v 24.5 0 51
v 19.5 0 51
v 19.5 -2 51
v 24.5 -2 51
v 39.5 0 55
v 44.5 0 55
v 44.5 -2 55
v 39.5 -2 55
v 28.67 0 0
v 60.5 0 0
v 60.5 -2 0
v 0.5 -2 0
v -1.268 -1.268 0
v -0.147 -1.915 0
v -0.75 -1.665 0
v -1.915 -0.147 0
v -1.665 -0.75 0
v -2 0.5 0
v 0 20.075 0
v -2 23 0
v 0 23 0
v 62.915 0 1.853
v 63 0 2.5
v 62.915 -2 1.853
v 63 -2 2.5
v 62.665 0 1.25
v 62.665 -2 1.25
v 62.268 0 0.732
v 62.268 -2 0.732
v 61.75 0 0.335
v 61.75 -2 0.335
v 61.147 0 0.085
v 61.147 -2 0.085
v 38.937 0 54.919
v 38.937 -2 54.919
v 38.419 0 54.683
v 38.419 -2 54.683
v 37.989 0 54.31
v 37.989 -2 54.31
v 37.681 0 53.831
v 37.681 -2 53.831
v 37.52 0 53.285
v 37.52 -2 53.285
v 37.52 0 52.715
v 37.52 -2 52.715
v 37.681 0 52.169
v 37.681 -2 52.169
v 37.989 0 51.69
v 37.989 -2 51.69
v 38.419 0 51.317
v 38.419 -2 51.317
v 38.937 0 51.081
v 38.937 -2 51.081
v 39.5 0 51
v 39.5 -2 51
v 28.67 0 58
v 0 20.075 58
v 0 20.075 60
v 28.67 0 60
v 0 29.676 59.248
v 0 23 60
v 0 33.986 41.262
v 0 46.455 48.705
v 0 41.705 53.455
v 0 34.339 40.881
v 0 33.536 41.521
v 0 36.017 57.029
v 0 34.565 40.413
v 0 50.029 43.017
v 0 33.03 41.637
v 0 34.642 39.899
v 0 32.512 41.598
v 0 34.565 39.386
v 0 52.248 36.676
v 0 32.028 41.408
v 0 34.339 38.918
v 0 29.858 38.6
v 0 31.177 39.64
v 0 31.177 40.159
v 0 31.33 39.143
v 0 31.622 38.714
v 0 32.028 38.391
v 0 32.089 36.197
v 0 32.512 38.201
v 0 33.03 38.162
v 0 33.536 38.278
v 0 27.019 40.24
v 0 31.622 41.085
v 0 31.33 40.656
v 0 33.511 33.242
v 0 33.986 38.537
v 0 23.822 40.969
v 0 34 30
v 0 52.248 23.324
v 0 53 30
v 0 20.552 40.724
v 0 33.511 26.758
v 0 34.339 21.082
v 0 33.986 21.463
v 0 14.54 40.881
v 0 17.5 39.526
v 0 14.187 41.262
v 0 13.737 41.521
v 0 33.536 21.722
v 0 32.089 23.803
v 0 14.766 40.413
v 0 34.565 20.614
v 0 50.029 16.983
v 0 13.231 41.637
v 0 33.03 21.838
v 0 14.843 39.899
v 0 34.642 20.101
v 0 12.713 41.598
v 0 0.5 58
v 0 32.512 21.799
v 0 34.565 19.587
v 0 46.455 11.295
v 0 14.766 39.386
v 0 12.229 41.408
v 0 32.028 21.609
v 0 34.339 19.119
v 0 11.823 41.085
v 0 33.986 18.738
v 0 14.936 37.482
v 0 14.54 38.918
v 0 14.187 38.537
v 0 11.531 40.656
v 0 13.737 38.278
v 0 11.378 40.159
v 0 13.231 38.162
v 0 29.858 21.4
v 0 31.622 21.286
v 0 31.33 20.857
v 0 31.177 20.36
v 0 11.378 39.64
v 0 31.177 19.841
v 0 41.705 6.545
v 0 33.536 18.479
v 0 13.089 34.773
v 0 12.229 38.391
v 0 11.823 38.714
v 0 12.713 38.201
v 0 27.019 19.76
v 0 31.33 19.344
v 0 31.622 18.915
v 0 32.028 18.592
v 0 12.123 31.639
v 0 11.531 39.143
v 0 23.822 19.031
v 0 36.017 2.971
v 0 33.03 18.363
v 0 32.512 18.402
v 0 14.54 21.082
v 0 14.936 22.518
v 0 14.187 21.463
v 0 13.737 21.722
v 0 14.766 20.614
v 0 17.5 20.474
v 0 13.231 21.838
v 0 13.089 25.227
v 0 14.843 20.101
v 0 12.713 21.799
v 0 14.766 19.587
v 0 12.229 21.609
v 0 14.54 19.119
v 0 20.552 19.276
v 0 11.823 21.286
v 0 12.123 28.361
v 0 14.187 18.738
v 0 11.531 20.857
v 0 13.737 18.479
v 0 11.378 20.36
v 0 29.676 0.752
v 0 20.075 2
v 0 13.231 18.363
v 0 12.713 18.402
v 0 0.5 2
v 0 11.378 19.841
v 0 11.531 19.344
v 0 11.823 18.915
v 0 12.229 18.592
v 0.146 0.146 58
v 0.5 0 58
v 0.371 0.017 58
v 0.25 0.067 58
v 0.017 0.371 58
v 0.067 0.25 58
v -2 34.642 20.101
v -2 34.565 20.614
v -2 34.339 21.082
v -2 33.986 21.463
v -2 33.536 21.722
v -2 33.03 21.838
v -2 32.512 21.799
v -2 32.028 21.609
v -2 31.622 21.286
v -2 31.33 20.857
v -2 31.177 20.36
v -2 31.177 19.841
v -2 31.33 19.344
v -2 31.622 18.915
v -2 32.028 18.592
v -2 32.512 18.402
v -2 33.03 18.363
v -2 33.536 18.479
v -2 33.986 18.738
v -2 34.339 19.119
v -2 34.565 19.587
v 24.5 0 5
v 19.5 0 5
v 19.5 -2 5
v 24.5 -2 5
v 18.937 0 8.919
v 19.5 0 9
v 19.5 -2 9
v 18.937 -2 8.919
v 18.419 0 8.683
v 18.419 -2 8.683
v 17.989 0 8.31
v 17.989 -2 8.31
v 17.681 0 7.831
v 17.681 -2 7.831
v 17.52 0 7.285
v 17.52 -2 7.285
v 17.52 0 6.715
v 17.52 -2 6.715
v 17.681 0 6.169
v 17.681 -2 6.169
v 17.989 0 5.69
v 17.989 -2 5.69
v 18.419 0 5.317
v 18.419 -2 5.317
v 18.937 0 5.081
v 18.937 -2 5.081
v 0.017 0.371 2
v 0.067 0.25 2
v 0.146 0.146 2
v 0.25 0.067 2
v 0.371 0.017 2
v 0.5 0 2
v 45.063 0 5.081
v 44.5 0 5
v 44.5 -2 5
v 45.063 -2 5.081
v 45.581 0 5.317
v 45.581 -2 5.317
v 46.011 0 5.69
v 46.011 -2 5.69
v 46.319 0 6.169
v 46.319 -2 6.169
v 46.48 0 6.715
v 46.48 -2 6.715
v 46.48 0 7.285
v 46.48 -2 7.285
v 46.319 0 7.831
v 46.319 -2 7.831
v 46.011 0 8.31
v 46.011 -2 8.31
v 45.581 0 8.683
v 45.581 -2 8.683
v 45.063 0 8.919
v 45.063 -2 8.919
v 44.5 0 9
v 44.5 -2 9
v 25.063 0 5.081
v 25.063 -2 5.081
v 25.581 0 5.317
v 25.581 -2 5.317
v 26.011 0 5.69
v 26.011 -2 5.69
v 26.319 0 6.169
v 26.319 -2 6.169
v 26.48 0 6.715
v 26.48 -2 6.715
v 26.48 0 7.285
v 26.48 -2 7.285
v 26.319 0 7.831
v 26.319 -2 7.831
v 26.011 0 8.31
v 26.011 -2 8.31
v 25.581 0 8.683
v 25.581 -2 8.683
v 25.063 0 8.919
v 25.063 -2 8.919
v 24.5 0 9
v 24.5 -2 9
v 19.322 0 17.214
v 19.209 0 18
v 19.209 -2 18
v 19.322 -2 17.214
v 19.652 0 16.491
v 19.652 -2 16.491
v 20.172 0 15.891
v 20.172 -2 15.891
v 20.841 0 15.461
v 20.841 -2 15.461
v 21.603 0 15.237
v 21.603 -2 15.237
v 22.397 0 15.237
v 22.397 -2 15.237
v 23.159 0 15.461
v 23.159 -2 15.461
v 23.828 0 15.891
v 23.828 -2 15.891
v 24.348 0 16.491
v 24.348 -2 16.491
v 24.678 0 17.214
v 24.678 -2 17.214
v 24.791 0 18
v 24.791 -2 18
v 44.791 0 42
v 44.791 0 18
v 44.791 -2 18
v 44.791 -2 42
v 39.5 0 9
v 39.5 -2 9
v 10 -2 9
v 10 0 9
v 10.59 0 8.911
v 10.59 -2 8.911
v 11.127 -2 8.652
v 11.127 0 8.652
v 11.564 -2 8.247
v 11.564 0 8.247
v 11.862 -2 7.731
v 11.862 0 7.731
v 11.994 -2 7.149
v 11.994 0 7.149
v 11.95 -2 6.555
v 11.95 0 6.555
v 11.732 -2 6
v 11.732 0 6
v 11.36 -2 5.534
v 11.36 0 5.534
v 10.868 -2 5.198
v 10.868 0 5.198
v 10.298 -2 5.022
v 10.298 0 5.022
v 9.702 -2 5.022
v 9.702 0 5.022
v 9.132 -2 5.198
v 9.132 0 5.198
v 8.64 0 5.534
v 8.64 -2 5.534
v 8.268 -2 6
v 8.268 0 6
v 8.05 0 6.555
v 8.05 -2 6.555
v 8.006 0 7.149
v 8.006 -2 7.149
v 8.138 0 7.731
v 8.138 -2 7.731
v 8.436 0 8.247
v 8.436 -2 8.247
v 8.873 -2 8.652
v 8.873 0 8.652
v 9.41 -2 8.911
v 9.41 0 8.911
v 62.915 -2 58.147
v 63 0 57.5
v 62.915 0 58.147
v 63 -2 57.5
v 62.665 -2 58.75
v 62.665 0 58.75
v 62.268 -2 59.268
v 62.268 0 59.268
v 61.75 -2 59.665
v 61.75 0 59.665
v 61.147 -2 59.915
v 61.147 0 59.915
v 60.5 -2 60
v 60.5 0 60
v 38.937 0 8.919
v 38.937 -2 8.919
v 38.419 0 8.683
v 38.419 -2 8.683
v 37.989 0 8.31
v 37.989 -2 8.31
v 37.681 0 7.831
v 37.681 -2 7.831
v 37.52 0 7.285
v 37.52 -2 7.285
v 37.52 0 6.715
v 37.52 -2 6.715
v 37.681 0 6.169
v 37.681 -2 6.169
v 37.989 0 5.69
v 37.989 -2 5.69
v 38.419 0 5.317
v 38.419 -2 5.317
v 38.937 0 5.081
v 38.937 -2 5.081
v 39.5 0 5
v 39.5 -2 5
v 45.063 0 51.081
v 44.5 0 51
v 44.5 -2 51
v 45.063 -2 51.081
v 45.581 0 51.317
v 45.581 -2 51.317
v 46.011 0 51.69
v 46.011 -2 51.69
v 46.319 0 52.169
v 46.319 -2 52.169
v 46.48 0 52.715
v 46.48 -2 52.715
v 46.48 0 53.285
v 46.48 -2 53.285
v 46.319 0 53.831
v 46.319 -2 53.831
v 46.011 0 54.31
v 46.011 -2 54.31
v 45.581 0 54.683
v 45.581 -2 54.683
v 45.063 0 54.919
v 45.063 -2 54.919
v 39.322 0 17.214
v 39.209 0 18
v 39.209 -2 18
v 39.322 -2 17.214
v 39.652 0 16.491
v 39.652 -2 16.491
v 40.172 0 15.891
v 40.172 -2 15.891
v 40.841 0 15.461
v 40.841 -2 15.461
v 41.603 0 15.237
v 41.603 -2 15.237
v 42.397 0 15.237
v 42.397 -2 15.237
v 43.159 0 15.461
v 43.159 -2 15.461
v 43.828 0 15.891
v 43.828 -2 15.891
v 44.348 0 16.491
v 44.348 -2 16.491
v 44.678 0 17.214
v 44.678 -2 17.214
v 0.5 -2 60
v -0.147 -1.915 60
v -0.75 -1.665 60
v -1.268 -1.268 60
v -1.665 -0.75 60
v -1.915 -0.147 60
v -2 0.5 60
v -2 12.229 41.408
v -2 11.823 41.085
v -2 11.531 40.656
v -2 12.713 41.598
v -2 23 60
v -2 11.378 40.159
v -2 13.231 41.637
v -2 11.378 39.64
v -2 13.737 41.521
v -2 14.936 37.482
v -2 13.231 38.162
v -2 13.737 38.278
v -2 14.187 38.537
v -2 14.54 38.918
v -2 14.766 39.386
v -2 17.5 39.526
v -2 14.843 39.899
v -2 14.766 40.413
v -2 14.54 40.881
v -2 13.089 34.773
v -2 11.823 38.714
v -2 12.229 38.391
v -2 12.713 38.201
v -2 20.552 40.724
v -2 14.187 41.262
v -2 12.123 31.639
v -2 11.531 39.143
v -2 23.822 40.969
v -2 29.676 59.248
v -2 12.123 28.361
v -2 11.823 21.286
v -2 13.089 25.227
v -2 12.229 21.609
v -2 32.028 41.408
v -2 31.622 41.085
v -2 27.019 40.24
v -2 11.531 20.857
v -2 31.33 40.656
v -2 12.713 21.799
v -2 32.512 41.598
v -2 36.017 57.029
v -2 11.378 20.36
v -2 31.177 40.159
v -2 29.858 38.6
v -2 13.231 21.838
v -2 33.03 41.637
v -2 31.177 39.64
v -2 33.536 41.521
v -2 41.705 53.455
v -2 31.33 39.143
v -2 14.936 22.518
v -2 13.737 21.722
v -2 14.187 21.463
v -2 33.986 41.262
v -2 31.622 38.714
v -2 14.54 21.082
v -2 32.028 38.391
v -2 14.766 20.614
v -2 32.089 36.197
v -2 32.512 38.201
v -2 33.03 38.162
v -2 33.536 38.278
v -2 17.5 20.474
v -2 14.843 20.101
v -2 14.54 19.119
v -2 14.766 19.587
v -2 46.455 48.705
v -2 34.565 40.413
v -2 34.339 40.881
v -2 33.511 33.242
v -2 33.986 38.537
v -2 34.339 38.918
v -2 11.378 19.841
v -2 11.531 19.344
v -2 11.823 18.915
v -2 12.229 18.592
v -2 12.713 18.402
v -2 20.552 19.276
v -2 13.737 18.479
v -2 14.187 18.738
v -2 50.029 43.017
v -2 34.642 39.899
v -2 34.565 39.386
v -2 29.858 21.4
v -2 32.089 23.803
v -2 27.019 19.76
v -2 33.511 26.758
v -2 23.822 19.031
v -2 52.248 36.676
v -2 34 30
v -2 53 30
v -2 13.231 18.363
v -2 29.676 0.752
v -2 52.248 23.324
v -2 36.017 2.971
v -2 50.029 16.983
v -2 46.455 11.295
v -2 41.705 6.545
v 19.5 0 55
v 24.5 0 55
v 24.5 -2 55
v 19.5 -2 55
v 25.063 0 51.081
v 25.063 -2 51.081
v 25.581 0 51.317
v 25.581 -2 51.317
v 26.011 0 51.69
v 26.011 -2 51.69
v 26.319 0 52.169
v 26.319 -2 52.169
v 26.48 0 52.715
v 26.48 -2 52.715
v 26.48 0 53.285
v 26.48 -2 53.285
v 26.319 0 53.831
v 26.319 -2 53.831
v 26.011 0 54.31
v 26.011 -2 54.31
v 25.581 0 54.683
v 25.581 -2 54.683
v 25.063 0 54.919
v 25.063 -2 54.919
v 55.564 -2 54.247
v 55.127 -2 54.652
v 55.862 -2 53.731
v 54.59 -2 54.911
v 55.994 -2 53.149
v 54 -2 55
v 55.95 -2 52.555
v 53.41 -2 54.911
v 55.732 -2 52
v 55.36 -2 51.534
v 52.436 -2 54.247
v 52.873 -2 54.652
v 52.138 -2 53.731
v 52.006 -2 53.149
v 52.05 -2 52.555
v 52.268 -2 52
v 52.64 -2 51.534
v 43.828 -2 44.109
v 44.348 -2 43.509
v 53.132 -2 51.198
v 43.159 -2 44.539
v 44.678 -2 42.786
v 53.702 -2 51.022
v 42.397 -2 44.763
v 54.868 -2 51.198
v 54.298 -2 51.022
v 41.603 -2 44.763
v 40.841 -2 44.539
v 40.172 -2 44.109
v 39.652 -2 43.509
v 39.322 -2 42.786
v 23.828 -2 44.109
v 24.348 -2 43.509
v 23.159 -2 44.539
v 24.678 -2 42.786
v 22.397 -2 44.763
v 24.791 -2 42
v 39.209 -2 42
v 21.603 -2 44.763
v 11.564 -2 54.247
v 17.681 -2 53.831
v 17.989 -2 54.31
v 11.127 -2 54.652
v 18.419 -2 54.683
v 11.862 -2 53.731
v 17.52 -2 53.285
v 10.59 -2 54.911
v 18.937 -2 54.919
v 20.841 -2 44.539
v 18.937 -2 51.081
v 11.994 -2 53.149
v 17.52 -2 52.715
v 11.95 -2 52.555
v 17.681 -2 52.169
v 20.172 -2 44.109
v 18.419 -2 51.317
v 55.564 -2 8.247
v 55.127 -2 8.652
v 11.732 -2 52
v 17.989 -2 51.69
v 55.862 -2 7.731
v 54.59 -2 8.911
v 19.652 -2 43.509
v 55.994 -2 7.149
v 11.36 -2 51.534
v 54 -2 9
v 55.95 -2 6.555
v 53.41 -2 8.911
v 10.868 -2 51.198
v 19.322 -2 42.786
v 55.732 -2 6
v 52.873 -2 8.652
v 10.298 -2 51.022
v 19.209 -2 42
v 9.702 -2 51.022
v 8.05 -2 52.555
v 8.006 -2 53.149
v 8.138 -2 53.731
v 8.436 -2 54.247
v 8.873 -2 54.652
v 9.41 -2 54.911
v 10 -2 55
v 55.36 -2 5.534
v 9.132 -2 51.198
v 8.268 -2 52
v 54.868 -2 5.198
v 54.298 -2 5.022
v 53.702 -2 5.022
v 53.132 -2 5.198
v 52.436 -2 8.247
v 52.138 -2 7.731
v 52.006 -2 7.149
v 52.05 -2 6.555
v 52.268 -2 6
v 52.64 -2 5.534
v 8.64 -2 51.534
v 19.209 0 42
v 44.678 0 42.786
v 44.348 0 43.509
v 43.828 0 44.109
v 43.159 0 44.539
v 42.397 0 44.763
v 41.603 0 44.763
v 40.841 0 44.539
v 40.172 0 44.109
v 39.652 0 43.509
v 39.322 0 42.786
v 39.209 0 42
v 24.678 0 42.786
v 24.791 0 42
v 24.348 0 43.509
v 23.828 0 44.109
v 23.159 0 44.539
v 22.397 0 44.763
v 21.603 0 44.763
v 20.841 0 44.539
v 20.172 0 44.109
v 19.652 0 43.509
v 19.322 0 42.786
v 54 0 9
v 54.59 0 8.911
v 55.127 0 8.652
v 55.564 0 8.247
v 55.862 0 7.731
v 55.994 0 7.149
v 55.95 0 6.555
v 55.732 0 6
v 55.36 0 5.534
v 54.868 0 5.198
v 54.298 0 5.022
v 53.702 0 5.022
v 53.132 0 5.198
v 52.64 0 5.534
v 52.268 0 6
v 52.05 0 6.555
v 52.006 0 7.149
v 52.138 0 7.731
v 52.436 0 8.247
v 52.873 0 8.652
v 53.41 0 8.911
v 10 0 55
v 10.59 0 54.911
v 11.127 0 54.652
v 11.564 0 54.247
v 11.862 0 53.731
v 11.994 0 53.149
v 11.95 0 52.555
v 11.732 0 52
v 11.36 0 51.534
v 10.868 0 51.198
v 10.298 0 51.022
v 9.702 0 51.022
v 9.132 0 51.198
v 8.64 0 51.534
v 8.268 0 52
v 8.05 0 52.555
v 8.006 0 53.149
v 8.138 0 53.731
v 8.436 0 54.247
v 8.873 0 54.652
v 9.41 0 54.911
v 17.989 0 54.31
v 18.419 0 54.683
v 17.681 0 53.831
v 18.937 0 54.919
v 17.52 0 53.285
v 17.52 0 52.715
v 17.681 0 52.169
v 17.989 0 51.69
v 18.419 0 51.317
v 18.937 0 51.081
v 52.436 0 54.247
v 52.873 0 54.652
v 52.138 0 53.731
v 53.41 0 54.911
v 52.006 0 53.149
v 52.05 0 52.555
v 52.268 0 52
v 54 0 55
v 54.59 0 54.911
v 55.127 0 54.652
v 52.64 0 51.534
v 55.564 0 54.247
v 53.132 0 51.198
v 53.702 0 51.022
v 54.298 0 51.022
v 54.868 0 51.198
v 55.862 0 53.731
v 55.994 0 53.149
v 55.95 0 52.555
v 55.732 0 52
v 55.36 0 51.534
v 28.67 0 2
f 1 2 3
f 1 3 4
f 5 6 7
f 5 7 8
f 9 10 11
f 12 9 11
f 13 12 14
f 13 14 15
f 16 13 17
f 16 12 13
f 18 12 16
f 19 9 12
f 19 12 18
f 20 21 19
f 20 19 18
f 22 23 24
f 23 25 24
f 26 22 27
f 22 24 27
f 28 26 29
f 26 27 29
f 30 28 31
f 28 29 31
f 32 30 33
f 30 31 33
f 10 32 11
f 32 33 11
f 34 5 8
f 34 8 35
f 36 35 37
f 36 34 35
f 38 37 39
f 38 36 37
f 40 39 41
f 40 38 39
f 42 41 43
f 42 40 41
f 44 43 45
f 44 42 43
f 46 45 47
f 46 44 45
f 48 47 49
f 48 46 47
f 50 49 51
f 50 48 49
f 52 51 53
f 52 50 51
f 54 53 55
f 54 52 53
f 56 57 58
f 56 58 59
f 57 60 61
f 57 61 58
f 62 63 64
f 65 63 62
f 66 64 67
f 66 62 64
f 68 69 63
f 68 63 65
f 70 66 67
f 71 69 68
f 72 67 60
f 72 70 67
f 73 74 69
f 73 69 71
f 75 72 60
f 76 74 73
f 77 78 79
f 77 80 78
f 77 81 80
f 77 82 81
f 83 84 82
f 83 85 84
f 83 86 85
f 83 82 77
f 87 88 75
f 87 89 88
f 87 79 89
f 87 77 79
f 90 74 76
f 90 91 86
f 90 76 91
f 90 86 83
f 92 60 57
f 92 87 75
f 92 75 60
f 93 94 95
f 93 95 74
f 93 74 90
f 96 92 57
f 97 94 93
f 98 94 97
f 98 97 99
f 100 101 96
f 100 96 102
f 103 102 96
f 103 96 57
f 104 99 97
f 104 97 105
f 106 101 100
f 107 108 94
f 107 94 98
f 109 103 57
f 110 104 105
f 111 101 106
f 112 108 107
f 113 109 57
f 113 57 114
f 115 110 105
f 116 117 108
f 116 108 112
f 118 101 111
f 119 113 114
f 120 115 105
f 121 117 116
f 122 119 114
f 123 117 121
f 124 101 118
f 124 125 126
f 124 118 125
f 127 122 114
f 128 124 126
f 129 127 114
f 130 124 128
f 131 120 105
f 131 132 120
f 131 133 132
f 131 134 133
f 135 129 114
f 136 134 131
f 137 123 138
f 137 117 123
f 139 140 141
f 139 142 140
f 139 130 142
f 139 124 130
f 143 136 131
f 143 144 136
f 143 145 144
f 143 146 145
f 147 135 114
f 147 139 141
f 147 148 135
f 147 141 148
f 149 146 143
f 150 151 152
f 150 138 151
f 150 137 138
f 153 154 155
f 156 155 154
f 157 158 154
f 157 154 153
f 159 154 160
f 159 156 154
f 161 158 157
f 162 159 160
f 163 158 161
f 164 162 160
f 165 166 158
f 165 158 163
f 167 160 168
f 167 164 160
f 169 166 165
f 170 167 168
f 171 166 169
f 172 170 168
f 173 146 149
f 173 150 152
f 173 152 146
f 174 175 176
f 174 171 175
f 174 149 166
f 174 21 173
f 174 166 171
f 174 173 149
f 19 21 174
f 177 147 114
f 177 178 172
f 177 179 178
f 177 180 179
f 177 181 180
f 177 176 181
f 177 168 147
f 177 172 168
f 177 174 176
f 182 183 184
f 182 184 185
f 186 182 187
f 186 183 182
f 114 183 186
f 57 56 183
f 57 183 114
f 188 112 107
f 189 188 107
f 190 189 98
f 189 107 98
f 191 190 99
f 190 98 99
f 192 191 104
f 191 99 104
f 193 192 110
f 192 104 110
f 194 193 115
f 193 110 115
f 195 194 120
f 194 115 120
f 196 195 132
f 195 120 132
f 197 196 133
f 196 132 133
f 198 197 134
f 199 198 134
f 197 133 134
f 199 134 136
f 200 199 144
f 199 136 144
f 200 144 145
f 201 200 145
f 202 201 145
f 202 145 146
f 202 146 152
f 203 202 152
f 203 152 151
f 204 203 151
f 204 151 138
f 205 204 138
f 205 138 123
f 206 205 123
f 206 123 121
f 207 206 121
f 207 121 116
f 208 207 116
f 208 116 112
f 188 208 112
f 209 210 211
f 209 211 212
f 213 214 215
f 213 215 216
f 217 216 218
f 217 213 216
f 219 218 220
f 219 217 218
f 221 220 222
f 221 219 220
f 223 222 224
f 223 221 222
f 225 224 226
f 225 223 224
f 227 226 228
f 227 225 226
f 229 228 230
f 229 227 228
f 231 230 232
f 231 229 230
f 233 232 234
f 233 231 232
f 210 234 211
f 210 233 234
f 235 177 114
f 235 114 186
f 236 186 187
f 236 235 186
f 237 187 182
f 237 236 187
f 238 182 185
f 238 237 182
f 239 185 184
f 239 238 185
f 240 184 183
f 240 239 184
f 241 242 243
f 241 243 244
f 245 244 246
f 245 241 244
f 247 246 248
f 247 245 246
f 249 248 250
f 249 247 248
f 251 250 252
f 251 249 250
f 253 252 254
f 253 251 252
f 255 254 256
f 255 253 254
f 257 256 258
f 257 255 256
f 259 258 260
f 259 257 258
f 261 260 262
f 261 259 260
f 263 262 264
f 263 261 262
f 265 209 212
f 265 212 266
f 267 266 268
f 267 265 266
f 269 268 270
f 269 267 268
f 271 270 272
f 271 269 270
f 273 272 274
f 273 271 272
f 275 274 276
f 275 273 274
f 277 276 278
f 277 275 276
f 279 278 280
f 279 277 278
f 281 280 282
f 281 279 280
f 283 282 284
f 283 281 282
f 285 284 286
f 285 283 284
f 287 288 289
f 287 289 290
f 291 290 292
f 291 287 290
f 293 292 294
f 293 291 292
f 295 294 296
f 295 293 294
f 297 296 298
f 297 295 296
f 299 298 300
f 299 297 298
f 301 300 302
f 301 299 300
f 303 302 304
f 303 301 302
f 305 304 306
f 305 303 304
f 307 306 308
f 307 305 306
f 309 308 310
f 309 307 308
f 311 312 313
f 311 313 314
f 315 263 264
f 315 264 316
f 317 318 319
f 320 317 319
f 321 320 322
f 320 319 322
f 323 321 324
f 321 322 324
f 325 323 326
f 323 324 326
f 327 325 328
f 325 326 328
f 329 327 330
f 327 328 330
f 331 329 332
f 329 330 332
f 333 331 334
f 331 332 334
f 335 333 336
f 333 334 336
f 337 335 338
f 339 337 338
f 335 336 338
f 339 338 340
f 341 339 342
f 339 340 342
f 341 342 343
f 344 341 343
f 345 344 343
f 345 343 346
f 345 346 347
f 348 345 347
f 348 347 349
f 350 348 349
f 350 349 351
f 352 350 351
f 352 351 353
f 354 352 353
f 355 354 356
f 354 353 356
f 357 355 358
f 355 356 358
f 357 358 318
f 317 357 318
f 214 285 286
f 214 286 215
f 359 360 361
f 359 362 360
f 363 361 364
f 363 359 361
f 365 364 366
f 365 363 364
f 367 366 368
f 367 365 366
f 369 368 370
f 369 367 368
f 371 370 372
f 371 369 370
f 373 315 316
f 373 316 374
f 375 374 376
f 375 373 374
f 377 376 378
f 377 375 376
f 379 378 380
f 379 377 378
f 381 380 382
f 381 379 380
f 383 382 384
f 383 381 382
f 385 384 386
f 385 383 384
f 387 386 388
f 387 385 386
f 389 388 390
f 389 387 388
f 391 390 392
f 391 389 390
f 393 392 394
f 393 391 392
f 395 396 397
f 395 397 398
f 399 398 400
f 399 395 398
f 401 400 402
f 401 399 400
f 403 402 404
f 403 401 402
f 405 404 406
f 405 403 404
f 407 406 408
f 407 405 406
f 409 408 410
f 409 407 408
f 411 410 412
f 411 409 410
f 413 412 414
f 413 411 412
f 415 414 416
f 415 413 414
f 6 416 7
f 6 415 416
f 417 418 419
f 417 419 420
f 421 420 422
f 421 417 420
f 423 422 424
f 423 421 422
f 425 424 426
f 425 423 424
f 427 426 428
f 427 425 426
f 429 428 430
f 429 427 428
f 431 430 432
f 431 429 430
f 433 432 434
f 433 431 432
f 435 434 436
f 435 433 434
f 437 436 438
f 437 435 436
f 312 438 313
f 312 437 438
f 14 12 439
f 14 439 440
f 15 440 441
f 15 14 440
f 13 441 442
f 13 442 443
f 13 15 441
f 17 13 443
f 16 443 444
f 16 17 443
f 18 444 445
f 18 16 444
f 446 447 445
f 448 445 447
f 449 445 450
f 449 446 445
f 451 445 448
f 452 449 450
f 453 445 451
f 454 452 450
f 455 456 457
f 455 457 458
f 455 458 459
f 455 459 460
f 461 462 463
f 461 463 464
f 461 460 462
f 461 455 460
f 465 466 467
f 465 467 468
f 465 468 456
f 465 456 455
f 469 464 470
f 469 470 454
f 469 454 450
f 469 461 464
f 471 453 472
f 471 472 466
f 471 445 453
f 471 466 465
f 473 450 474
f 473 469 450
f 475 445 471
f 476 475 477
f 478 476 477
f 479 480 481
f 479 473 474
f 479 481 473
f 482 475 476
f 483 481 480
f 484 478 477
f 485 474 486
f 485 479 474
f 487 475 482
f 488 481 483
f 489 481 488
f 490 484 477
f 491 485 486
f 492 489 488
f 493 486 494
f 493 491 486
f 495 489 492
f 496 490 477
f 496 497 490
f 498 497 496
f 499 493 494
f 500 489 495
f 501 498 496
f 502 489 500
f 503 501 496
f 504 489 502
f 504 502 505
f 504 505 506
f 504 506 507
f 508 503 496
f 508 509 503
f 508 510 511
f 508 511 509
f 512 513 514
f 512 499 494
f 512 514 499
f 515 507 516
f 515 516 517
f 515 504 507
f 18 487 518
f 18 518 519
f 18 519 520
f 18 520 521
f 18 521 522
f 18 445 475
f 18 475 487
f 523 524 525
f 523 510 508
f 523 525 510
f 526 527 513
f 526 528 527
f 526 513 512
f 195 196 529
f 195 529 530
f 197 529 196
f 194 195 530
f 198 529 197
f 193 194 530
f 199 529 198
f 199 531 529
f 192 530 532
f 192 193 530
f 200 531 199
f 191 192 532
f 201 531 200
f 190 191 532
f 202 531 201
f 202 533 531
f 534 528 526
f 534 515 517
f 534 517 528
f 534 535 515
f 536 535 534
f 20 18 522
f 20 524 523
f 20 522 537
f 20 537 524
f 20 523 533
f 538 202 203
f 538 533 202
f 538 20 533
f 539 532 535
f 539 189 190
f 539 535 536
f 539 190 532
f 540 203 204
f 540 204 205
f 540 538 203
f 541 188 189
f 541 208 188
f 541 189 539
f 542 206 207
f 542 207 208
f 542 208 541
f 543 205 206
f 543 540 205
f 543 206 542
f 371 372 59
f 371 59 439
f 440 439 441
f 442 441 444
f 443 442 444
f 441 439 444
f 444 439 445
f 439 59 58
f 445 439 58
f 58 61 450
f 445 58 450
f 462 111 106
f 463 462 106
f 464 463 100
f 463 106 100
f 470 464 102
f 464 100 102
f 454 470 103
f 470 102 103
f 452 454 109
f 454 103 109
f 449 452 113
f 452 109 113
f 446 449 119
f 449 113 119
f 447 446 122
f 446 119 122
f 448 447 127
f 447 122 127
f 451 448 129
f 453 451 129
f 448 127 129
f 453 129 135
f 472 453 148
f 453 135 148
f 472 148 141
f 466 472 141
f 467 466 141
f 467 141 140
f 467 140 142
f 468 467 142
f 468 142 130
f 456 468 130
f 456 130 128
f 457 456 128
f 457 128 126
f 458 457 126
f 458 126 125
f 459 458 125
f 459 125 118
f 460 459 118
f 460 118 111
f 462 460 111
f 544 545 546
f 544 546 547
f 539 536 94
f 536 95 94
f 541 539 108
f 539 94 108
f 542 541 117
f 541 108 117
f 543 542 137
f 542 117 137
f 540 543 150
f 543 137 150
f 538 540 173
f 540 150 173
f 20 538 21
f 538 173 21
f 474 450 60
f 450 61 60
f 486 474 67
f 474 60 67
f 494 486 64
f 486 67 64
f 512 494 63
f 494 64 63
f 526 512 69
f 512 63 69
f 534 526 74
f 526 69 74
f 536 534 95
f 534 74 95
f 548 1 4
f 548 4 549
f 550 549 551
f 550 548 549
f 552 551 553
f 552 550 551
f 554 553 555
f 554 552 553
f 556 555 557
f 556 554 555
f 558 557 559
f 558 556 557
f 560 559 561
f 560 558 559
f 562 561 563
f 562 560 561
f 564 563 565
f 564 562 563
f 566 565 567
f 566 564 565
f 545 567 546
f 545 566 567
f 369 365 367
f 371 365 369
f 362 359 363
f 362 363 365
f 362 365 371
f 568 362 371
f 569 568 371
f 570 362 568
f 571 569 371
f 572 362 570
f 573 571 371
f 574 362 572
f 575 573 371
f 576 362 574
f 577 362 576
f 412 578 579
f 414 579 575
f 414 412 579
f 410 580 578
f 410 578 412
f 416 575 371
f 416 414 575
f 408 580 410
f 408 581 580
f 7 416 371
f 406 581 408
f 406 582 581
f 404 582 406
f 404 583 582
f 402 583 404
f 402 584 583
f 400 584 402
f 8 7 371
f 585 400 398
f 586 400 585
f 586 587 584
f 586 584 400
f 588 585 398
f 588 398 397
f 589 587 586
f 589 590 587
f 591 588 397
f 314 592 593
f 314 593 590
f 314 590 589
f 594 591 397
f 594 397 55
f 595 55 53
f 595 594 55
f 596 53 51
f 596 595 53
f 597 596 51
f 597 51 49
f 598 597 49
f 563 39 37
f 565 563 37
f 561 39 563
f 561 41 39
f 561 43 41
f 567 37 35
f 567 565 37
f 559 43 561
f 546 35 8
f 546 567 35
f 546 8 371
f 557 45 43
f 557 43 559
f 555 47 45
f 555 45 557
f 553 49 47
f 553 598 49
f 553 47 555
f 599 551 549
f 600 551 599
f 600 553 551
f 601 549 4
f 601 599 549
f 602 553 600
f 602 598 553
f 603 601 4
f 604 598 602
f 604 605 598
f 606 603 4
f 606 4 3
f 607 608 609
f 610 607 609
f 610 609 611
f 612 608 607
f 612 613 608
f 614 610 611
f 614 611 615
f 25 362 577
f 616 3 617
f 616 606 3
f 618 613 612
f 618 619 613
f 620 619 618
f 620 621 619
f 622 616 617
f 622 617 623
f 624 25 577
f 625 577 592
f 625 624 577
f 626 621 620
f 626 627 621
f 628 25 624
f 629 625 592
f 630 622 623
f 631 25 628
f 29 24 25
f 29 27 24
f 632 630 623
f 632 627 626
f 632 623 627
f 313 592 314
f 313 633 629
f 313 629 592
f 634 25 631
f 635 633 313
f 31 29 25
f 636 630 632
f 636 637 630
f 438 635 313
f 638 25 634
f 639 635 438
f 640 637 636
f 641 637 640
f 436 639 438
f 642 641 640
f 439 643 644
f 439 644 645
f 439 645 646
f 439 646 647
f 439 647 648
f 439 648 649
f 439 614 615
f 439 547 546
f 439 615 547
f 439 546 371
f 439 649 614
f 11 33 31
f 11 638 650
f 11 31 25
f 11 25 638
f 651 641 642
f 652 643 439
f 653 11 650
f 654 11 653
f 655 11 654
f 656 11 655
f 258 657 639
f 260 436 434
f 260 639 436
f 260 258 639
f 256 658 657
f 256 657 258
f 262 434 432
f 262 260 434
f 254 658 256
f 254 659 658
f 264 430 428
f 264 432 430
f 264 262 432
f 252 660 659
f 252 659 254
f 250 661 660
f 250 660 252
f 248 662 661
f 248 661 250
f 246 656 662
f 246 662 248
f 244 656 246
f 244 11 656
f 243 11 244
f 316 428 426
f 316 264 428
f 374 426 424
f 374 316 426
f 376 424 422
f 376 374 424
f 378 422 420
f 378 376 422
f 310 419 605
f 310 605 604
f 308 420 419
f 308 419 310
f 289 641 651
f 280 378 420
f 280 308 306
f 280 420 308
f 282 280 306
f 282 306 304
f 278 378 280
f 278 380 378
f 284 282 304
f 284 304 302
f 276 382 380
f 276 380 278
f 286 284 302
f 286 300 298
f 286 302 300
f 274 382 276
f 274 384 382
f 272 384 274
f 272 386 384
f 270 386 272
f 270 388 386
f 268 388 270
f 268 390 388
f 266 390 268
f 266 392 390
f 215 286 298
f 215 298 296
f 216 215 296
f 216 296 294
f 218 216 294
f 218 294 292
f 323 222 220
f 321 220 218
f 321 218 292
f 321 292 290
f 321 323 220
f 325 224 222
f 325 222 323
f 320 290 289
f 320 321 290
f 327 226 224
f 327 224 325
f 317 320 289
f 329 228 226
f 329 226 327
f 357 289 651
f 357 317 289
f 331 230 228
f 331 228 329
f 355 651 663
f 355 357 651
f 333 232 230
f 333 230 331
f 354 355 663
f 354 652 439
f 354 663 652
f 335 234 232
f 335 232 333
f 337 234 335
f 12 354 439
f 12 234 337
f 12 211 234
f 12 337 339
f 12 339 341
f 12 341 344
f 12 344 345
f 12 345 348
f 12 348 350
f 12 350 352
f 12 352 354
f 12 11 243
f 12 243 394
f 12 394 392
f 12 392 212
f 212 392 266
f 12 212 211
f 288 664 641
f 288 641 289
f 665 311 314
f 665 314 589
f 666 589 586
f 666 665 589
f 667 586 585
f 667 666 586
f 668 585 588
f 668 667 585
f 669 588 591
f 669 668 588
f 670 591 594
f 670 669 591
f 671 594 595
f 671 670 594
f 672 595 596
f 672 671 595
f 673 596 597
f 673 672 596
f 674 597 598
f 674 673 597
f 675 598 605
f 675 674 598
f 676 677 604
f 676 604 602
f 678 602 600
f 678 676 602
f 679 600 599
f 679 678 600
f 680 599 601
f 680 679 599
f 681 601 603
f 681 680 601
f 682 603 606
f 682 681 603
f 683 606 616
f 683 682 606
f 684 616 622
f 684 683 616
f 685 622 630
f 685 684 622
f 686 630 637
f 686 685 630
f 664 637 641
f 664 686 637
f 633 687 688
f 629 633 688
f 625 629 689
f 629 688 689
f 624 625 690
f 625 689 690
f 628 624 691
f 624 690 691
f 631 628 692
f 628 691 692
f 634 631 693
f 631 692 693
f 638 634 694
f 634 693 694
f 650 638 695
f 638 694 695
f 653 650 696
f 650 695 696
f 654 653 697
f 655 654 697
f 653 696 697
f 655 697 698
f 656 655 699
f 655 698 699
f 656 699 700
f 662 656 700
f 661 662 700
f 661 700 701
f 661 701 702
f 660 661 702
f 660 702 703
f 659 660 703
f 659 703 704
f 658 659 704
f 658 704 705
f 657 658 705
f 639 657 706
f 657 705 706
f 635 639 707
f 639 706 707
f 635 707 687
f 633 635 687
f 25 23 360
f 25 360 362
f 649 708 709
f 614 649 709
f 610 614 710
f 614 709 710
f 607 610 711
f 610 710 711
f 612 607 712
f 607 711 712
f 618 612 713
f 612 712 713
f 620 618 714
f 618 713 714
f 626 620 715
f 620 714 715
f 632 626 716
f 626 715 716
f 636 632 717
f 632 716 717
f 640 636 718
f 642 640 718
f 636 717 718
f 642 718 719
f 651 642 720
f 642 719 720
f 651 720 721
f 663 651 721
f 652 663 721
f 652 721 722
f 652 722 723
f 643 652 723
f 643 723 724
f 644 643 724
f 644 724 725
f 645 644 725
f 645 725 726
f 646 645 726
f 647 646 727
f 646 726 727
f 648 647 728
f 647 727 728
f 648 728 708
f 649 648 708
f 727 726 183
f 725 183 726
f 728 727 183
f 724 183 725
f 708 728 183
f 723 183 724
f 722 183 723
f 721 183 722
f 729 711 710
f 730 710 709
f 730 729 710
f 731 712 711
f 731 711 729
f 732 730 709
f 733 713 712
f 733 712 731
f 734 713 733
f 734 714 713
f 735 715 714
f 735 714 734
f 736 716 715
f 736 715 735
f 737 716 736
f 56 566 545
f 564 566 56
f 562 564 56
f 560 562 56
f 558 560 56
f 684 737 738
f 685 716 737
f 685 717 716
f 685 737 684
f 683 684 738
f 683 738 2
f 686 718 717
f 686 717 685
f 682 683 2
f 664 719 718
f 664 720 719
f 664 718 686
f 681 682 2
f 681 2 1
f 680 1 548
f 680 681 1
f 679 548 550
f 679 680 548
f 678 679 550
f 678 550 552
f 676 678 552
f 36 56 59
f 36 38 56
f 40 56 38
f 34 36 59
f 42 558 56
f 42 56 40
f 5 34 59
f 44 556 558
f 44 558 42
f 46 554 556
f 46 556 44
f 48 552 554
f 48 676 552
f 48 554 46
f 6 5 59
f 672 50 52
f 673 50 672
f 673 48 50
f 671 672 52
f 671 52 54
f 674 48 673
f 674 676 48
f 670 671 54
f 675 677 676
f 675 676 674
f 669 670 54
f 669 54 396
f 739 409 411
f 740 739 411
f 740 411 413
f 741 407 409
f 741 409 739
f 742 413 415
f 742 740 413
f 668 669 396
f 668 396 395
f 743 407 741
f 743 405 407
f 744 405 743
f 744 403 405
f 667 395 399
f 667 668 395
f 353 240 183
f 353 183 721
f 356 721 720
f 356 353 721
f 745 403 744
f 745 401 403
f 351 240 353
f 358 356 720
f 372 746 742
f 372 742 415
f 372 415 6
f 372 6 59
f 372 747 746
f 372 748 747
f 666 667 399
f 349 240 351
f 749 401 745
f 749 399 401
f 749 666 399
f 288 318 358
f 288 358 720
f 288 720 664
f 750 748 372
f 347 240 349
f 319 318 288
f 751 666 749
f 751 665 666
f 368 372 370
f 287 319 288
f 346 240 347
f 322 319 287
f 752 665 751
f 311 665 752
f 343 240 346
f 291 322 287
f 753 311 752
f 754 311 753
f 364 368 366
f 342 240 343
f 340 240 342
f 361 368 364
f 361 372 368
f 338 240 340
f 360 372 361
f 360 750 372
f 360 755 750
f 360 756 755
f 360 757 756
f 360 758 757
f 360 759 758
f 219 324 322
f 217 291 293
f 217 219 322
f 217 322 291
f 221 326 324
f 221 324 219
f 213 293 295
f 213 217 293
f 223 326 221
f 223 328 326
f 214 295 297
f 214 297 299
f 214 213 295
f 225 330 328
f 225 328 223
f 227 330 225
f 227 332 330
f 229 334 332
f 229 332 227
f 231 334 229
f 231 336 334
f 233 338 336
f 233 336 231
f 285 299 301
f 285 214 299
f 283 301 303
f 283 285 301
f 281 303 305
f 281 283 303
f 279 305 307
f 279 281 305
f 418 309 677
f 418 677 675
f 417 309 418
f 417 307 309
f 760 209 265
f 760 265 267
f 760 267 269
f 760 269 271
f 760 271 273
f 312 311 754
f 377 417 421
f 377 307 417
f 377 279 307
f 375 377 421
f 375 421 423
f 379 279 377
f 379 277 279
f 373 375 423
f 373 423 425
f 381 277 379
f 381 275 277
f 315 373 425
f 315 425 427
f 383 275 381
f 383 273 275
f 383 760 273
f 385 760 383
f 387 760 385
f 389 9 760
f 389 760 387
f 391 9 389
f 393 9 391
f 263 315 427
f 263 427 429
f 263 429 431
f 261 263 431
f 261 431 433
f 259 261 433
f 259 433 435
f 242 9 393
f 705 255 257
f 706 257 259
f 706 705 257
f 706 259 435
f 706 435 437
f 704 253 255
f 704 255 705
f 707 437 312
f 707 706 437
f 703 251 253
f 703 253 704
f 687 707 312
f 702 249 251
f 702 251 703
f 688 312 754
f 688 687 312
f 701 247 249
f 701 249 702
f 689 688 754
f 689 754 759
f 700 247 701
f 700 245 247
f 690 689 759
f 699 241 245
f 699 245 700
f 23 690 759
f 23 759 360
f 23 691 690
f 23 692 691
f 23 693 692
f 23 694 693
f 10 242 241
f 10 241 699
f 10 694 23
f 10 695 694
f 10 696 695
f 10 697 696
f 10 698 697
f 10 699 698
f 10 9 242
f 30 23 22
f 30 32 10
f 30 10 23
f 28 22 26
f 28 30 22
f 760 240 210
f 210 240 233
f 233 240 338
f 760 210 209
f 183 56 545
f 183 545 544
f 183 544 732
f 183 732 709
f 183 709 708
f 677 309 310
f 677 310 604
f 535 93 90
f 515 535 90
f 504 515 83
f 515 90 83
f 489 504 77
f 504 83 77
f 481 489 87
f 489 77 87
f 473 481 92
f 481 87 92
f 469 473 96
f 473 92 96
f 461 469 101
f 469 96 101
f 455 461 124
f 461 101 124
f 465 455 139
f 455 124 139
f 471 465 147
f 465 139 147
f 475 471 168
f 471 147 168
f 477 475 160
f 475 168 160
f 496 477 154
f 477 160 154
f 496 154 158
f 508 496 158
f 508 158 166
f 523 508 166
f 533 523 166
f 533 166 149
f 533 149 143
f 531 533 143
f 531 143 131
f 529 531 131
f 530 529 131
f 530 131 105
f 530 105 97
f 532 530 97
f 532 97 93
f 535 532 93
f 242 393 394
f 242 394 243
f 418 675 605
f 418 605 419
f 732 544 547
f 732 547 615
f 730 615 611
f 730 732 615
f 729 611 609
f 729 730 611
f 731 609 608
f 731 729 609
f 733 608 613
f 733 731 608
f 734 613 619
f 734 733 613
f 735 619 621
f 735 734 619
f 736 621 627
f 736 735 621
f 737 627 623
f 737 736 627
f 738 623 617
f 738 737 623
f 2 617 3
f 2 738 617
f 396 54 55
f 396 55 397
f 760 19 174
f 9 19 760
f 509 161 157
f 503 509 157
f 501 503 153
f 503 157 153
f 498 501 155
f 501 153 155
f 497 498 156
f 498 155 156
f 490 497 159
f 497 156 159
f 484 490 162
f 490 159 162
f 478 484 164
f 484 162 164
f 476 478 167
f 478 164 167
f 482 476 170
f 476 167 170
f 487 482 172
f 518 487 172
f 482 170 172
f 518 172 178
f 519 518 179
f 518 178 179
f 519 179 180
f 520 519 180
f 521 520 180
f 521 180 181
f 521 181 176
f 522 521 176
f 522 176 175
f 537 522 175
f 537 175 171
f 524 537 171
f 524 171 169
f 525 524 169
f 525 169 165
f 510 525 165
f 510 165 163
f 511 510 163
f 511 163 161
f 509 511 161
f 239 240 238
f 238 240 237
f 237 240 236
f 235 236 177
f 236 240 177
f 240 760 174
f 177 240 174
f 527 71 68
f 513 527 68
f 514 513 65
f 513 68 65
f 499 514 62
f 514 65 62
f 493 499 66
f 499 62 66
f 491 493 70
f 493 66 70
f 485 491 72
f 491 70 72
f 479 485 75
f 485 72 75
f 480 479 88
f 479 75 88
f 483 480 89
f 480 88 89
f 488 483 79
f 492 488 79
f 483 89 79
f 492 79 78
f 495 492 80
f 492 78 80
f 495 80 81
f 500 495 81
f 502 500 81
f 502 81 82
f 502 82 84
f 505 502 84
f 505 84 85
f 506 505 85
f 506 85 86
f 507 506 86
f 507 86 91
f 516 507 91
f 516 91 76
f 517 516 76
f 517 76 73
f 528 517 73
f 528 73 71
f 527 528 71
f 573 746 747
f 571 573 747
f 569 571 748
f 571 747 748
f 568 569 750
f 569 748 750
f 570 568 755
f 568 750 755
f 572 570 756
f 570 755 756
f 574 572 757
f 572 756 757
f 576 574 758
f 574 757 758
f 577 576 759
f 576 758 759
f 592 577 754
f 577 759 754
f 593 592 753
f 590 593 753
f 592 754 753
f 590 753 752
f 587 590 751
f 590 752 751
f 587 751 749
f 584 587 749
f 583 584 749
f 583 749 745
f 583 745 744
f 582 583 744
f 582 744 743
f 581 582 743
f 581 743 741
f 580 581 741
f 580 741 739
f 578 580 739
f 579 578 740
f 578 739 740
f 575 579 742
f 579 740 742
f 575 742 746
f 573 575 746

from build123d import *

# Parameters (mm, degrees)
BOSS_EXTRUDE1_DEPTH = 60
FILLET2_R           = 2.5
FILLET3_R           = 2.5
FILLET4_R           = 30
FILLET5_R           = 30
SKETCH3_R           = 11
SKETCH3_R_2         = 1.742420083
CUT_EXTRUDE1_DEPTH  = 5
BOSS_EXTRUDE3_START = -2
BOSS_EXTRUDE3_DEPTH = 2
BOSS_EXTRUDE4_DEPTH = 2
SKETCH7_R           = 2
CUT_EXTRUDE2_DEPTH  = 2


with BuildPart() as part:
    # Sketch2 → Boss-Extrude1 (new body)
    with BuildSketch(Plane.XY):
        with BuildLine():
            Line((0.5, 0), (63, 0))
            Line((63, 0), (63, -2))
            Line((63, -2), (0.5, -2))
            ThreePointArc((0.5, -2), (-1.267766953, -1.267766953), (-2, 0.5))
            Line((-2, 0.5), (-2, 53))
            Line((-2, 53), (0, 53))
            Line((0, 53), (0, 0.5))
            ThreePointArc((0, 0.5), (0.146446609, 0.146446609), (0.5, 0))
        make_face()
    extrude(amount=BOSS_EXTRUDE1_DEPTH)

    # Fillet2
    fillet2_edges = [part.edges().sort_by_distance(p)[0] for p in [
        (63, -1, 60),
    ]]
    fillet(fillet2_edges, radius=FILLET2_R)

    # Fillet3
    fillet3_edges = [part.edges().sort_by_distance(p)[0] for p in [
        (63, -1, 0),
    ]]
    fillet(fillet3_edges, radius=FILLET3_R)

    # Fillet4
    fillet4_edges = [part.edges().sort_by_distance(p)[0] for p in [
        (-1, 53, 60),
    ]]
    fillet(fillet4_edges, radius=FILLET4_R)

    # Fillet5
    fillet5_edges = [part.edges().sort_by_distance(p)[0] for p in [
        (-1, 53, 0),
    ]]
    fillet(fillet5_edges, radius=FILLET5_R - 0.0001)  # a hair under: the kernel refuses the full size

    # Sketch3 → Cut-Extrude1 (cut)
    with BuildSketch(Plane(origin=(0, 0, 0), x_dir=(0, 0, -1), z_dir=(1, 0, 0))):
        with Locations(Location((-30, 23, 0), (0, 0, 90))):
            Circle(SKETCH3_R)
        with Locations(Location((-39.899494937, 13.100505063, 0), (0, 0, 90))):
            Circle(SKETCH3_R_2)
        with Locations(Location((-39.899494937, 32.899494937, 0), (0, 0, 90))):
            Circle(SKETCH3_R_2)
        with Locations(Location((-20.100505063, 32.899494937, 0), (0, 0, 90))):
            Circle(SKETCH3_R_2)
        with Locations(Location((-20.100505063, 13.100505063, 0), (0, 0, 90))):
            Circle(SKETCH3_R_2)
    extrude(amount=-CUT_EXTRUDE1_DEPTH, mode=Mode.SUBTRACT)

    # Sketch4 → Boss-Extrude3 (add)
    with BuildSketch(Plane.XY.offset(60).offset(BOSS_EXTRUDE3_START)):
        with BuildLine():
            Line((0, 20.075175272), (28.67032155, 0))
            Line((28.67032155, 0), (0.5, 0))
            ThreePointArc((0.5, 0), (0.146446609, 0.146446609), (0, 0.5))
            Line((0, 0.5), (0, 20.075175272))
        make_face()
    extrude(amount=BOSS_EXTRUDE3_DEPTH)

    # Sketch6 → Boss-Extrude4 (add)
    with BuildSketch(Plane(origin=(0, 0, 0), x_dir=(-1, 0, 0), z_dir=(0, 0, -1))):
        with BuildLine():
            Line((0, 0.5), (0, 20.075175272))
            Line((0, 20.075175272), (-28.67032155, 0))
            Line((-28.67032155, 0), (-0.5, 0))
            ThreePointArc((-0.5, 0), (-0.146446609, 0.146446609), (0, 0.5))
        make_face()
    extrude(amount=-BOSS_EXTRUDE4_DEPTH)

    # Sketch7 → Cut-Extrude2 (cut)
    with BuildSketch(Plane(origin=(0, 0, 0), x_dir=(1, 0, 0), z_dir=(0, 1, 0))):
        with Locations(Location((54, -53, 0), (0, 0, 270))):
            Circle(SKETCH7_R)
        with Locations(Location((54, -7, 0), (0, 0, 270))):
            Circle(SKETCH7_R)
        with Locations(Location((10, -7, 0), (0, 0, 270))):
            Circle(SKETCH7_R)
        with Locations(Location((10, -53, 0), (0, 0, 270))):
            Circle(SKETCH7_R)
        with BuildLine():
            Line((44.5, -55), (39.5, -55))
            ThreePointArc((39.5, -55), (37.5, -53), (39.5, -51))
            Line((39.5, -51), (44.5, -51))
            ThreePointArc((44.5, -51), (46.5, -53), (44.5, -55))
        make_face()
        with BuildLine():
            Line((44.5, -9), (39.5, -9))
            ThreePointArc((39.5, -9), (37.5, -7), (39.5, -5))
            Line((39.5, -5), (44.5, -5))
            ThreePointArc((44.5, -5), (46.5, -7), (44.5, -9))
        make_face()
        with BuildLine():
            Line((24.5, -9), (19.5, -9))
            ThreePointArc((19.5, -9), (17.5, -7), (19.5, -5))
            Line((19.5, -5), (24.5, -5))
            ThreePointArc((24.5, -5), (26.5, -7), (24.5, -9))
        make_face()
        with BuildLine():
            Line((24.5, -55), (19.5, -55))
            ThreePointArc((19.5, -55), (17.5, -53), (19.5, -51))
            Line((19.5, -51), (24.5, -51))
            ThreePointArc((24.5, -51), (26.5, -53), (24.5, -55))
        make_face()
        with BuildLine():
            Line((24.79106514, -18), (24.79106514, -42))
            ThreePointArc((24.79106514, -42), (22, -44.79106514), (19.20893486, -42))
            Line((19.20893486, -42), (19.20893486, -18))
            ThreePointArc((19.20893486, -18), (22, -15.20893486), (24.79106514, -18))
        make_face()
        with BuildLine():
            Line((44.79106514, -18), (44.79106514, -42))
            ThreePointArc((44.79106514, -42), (42, -44.79106514), (39.20893486, -42))
            Line((39.20893486, -42), (39.20893486, -18))
            ThreePointArc((39.20893486, -18), (42, -15.20893486), (44.79106514, -18))
        make_face()
    extrude(amount=-CUT_EXTRUDE2_DEPTH, mode=Mode.SUBTRACT)


solid = part.part
